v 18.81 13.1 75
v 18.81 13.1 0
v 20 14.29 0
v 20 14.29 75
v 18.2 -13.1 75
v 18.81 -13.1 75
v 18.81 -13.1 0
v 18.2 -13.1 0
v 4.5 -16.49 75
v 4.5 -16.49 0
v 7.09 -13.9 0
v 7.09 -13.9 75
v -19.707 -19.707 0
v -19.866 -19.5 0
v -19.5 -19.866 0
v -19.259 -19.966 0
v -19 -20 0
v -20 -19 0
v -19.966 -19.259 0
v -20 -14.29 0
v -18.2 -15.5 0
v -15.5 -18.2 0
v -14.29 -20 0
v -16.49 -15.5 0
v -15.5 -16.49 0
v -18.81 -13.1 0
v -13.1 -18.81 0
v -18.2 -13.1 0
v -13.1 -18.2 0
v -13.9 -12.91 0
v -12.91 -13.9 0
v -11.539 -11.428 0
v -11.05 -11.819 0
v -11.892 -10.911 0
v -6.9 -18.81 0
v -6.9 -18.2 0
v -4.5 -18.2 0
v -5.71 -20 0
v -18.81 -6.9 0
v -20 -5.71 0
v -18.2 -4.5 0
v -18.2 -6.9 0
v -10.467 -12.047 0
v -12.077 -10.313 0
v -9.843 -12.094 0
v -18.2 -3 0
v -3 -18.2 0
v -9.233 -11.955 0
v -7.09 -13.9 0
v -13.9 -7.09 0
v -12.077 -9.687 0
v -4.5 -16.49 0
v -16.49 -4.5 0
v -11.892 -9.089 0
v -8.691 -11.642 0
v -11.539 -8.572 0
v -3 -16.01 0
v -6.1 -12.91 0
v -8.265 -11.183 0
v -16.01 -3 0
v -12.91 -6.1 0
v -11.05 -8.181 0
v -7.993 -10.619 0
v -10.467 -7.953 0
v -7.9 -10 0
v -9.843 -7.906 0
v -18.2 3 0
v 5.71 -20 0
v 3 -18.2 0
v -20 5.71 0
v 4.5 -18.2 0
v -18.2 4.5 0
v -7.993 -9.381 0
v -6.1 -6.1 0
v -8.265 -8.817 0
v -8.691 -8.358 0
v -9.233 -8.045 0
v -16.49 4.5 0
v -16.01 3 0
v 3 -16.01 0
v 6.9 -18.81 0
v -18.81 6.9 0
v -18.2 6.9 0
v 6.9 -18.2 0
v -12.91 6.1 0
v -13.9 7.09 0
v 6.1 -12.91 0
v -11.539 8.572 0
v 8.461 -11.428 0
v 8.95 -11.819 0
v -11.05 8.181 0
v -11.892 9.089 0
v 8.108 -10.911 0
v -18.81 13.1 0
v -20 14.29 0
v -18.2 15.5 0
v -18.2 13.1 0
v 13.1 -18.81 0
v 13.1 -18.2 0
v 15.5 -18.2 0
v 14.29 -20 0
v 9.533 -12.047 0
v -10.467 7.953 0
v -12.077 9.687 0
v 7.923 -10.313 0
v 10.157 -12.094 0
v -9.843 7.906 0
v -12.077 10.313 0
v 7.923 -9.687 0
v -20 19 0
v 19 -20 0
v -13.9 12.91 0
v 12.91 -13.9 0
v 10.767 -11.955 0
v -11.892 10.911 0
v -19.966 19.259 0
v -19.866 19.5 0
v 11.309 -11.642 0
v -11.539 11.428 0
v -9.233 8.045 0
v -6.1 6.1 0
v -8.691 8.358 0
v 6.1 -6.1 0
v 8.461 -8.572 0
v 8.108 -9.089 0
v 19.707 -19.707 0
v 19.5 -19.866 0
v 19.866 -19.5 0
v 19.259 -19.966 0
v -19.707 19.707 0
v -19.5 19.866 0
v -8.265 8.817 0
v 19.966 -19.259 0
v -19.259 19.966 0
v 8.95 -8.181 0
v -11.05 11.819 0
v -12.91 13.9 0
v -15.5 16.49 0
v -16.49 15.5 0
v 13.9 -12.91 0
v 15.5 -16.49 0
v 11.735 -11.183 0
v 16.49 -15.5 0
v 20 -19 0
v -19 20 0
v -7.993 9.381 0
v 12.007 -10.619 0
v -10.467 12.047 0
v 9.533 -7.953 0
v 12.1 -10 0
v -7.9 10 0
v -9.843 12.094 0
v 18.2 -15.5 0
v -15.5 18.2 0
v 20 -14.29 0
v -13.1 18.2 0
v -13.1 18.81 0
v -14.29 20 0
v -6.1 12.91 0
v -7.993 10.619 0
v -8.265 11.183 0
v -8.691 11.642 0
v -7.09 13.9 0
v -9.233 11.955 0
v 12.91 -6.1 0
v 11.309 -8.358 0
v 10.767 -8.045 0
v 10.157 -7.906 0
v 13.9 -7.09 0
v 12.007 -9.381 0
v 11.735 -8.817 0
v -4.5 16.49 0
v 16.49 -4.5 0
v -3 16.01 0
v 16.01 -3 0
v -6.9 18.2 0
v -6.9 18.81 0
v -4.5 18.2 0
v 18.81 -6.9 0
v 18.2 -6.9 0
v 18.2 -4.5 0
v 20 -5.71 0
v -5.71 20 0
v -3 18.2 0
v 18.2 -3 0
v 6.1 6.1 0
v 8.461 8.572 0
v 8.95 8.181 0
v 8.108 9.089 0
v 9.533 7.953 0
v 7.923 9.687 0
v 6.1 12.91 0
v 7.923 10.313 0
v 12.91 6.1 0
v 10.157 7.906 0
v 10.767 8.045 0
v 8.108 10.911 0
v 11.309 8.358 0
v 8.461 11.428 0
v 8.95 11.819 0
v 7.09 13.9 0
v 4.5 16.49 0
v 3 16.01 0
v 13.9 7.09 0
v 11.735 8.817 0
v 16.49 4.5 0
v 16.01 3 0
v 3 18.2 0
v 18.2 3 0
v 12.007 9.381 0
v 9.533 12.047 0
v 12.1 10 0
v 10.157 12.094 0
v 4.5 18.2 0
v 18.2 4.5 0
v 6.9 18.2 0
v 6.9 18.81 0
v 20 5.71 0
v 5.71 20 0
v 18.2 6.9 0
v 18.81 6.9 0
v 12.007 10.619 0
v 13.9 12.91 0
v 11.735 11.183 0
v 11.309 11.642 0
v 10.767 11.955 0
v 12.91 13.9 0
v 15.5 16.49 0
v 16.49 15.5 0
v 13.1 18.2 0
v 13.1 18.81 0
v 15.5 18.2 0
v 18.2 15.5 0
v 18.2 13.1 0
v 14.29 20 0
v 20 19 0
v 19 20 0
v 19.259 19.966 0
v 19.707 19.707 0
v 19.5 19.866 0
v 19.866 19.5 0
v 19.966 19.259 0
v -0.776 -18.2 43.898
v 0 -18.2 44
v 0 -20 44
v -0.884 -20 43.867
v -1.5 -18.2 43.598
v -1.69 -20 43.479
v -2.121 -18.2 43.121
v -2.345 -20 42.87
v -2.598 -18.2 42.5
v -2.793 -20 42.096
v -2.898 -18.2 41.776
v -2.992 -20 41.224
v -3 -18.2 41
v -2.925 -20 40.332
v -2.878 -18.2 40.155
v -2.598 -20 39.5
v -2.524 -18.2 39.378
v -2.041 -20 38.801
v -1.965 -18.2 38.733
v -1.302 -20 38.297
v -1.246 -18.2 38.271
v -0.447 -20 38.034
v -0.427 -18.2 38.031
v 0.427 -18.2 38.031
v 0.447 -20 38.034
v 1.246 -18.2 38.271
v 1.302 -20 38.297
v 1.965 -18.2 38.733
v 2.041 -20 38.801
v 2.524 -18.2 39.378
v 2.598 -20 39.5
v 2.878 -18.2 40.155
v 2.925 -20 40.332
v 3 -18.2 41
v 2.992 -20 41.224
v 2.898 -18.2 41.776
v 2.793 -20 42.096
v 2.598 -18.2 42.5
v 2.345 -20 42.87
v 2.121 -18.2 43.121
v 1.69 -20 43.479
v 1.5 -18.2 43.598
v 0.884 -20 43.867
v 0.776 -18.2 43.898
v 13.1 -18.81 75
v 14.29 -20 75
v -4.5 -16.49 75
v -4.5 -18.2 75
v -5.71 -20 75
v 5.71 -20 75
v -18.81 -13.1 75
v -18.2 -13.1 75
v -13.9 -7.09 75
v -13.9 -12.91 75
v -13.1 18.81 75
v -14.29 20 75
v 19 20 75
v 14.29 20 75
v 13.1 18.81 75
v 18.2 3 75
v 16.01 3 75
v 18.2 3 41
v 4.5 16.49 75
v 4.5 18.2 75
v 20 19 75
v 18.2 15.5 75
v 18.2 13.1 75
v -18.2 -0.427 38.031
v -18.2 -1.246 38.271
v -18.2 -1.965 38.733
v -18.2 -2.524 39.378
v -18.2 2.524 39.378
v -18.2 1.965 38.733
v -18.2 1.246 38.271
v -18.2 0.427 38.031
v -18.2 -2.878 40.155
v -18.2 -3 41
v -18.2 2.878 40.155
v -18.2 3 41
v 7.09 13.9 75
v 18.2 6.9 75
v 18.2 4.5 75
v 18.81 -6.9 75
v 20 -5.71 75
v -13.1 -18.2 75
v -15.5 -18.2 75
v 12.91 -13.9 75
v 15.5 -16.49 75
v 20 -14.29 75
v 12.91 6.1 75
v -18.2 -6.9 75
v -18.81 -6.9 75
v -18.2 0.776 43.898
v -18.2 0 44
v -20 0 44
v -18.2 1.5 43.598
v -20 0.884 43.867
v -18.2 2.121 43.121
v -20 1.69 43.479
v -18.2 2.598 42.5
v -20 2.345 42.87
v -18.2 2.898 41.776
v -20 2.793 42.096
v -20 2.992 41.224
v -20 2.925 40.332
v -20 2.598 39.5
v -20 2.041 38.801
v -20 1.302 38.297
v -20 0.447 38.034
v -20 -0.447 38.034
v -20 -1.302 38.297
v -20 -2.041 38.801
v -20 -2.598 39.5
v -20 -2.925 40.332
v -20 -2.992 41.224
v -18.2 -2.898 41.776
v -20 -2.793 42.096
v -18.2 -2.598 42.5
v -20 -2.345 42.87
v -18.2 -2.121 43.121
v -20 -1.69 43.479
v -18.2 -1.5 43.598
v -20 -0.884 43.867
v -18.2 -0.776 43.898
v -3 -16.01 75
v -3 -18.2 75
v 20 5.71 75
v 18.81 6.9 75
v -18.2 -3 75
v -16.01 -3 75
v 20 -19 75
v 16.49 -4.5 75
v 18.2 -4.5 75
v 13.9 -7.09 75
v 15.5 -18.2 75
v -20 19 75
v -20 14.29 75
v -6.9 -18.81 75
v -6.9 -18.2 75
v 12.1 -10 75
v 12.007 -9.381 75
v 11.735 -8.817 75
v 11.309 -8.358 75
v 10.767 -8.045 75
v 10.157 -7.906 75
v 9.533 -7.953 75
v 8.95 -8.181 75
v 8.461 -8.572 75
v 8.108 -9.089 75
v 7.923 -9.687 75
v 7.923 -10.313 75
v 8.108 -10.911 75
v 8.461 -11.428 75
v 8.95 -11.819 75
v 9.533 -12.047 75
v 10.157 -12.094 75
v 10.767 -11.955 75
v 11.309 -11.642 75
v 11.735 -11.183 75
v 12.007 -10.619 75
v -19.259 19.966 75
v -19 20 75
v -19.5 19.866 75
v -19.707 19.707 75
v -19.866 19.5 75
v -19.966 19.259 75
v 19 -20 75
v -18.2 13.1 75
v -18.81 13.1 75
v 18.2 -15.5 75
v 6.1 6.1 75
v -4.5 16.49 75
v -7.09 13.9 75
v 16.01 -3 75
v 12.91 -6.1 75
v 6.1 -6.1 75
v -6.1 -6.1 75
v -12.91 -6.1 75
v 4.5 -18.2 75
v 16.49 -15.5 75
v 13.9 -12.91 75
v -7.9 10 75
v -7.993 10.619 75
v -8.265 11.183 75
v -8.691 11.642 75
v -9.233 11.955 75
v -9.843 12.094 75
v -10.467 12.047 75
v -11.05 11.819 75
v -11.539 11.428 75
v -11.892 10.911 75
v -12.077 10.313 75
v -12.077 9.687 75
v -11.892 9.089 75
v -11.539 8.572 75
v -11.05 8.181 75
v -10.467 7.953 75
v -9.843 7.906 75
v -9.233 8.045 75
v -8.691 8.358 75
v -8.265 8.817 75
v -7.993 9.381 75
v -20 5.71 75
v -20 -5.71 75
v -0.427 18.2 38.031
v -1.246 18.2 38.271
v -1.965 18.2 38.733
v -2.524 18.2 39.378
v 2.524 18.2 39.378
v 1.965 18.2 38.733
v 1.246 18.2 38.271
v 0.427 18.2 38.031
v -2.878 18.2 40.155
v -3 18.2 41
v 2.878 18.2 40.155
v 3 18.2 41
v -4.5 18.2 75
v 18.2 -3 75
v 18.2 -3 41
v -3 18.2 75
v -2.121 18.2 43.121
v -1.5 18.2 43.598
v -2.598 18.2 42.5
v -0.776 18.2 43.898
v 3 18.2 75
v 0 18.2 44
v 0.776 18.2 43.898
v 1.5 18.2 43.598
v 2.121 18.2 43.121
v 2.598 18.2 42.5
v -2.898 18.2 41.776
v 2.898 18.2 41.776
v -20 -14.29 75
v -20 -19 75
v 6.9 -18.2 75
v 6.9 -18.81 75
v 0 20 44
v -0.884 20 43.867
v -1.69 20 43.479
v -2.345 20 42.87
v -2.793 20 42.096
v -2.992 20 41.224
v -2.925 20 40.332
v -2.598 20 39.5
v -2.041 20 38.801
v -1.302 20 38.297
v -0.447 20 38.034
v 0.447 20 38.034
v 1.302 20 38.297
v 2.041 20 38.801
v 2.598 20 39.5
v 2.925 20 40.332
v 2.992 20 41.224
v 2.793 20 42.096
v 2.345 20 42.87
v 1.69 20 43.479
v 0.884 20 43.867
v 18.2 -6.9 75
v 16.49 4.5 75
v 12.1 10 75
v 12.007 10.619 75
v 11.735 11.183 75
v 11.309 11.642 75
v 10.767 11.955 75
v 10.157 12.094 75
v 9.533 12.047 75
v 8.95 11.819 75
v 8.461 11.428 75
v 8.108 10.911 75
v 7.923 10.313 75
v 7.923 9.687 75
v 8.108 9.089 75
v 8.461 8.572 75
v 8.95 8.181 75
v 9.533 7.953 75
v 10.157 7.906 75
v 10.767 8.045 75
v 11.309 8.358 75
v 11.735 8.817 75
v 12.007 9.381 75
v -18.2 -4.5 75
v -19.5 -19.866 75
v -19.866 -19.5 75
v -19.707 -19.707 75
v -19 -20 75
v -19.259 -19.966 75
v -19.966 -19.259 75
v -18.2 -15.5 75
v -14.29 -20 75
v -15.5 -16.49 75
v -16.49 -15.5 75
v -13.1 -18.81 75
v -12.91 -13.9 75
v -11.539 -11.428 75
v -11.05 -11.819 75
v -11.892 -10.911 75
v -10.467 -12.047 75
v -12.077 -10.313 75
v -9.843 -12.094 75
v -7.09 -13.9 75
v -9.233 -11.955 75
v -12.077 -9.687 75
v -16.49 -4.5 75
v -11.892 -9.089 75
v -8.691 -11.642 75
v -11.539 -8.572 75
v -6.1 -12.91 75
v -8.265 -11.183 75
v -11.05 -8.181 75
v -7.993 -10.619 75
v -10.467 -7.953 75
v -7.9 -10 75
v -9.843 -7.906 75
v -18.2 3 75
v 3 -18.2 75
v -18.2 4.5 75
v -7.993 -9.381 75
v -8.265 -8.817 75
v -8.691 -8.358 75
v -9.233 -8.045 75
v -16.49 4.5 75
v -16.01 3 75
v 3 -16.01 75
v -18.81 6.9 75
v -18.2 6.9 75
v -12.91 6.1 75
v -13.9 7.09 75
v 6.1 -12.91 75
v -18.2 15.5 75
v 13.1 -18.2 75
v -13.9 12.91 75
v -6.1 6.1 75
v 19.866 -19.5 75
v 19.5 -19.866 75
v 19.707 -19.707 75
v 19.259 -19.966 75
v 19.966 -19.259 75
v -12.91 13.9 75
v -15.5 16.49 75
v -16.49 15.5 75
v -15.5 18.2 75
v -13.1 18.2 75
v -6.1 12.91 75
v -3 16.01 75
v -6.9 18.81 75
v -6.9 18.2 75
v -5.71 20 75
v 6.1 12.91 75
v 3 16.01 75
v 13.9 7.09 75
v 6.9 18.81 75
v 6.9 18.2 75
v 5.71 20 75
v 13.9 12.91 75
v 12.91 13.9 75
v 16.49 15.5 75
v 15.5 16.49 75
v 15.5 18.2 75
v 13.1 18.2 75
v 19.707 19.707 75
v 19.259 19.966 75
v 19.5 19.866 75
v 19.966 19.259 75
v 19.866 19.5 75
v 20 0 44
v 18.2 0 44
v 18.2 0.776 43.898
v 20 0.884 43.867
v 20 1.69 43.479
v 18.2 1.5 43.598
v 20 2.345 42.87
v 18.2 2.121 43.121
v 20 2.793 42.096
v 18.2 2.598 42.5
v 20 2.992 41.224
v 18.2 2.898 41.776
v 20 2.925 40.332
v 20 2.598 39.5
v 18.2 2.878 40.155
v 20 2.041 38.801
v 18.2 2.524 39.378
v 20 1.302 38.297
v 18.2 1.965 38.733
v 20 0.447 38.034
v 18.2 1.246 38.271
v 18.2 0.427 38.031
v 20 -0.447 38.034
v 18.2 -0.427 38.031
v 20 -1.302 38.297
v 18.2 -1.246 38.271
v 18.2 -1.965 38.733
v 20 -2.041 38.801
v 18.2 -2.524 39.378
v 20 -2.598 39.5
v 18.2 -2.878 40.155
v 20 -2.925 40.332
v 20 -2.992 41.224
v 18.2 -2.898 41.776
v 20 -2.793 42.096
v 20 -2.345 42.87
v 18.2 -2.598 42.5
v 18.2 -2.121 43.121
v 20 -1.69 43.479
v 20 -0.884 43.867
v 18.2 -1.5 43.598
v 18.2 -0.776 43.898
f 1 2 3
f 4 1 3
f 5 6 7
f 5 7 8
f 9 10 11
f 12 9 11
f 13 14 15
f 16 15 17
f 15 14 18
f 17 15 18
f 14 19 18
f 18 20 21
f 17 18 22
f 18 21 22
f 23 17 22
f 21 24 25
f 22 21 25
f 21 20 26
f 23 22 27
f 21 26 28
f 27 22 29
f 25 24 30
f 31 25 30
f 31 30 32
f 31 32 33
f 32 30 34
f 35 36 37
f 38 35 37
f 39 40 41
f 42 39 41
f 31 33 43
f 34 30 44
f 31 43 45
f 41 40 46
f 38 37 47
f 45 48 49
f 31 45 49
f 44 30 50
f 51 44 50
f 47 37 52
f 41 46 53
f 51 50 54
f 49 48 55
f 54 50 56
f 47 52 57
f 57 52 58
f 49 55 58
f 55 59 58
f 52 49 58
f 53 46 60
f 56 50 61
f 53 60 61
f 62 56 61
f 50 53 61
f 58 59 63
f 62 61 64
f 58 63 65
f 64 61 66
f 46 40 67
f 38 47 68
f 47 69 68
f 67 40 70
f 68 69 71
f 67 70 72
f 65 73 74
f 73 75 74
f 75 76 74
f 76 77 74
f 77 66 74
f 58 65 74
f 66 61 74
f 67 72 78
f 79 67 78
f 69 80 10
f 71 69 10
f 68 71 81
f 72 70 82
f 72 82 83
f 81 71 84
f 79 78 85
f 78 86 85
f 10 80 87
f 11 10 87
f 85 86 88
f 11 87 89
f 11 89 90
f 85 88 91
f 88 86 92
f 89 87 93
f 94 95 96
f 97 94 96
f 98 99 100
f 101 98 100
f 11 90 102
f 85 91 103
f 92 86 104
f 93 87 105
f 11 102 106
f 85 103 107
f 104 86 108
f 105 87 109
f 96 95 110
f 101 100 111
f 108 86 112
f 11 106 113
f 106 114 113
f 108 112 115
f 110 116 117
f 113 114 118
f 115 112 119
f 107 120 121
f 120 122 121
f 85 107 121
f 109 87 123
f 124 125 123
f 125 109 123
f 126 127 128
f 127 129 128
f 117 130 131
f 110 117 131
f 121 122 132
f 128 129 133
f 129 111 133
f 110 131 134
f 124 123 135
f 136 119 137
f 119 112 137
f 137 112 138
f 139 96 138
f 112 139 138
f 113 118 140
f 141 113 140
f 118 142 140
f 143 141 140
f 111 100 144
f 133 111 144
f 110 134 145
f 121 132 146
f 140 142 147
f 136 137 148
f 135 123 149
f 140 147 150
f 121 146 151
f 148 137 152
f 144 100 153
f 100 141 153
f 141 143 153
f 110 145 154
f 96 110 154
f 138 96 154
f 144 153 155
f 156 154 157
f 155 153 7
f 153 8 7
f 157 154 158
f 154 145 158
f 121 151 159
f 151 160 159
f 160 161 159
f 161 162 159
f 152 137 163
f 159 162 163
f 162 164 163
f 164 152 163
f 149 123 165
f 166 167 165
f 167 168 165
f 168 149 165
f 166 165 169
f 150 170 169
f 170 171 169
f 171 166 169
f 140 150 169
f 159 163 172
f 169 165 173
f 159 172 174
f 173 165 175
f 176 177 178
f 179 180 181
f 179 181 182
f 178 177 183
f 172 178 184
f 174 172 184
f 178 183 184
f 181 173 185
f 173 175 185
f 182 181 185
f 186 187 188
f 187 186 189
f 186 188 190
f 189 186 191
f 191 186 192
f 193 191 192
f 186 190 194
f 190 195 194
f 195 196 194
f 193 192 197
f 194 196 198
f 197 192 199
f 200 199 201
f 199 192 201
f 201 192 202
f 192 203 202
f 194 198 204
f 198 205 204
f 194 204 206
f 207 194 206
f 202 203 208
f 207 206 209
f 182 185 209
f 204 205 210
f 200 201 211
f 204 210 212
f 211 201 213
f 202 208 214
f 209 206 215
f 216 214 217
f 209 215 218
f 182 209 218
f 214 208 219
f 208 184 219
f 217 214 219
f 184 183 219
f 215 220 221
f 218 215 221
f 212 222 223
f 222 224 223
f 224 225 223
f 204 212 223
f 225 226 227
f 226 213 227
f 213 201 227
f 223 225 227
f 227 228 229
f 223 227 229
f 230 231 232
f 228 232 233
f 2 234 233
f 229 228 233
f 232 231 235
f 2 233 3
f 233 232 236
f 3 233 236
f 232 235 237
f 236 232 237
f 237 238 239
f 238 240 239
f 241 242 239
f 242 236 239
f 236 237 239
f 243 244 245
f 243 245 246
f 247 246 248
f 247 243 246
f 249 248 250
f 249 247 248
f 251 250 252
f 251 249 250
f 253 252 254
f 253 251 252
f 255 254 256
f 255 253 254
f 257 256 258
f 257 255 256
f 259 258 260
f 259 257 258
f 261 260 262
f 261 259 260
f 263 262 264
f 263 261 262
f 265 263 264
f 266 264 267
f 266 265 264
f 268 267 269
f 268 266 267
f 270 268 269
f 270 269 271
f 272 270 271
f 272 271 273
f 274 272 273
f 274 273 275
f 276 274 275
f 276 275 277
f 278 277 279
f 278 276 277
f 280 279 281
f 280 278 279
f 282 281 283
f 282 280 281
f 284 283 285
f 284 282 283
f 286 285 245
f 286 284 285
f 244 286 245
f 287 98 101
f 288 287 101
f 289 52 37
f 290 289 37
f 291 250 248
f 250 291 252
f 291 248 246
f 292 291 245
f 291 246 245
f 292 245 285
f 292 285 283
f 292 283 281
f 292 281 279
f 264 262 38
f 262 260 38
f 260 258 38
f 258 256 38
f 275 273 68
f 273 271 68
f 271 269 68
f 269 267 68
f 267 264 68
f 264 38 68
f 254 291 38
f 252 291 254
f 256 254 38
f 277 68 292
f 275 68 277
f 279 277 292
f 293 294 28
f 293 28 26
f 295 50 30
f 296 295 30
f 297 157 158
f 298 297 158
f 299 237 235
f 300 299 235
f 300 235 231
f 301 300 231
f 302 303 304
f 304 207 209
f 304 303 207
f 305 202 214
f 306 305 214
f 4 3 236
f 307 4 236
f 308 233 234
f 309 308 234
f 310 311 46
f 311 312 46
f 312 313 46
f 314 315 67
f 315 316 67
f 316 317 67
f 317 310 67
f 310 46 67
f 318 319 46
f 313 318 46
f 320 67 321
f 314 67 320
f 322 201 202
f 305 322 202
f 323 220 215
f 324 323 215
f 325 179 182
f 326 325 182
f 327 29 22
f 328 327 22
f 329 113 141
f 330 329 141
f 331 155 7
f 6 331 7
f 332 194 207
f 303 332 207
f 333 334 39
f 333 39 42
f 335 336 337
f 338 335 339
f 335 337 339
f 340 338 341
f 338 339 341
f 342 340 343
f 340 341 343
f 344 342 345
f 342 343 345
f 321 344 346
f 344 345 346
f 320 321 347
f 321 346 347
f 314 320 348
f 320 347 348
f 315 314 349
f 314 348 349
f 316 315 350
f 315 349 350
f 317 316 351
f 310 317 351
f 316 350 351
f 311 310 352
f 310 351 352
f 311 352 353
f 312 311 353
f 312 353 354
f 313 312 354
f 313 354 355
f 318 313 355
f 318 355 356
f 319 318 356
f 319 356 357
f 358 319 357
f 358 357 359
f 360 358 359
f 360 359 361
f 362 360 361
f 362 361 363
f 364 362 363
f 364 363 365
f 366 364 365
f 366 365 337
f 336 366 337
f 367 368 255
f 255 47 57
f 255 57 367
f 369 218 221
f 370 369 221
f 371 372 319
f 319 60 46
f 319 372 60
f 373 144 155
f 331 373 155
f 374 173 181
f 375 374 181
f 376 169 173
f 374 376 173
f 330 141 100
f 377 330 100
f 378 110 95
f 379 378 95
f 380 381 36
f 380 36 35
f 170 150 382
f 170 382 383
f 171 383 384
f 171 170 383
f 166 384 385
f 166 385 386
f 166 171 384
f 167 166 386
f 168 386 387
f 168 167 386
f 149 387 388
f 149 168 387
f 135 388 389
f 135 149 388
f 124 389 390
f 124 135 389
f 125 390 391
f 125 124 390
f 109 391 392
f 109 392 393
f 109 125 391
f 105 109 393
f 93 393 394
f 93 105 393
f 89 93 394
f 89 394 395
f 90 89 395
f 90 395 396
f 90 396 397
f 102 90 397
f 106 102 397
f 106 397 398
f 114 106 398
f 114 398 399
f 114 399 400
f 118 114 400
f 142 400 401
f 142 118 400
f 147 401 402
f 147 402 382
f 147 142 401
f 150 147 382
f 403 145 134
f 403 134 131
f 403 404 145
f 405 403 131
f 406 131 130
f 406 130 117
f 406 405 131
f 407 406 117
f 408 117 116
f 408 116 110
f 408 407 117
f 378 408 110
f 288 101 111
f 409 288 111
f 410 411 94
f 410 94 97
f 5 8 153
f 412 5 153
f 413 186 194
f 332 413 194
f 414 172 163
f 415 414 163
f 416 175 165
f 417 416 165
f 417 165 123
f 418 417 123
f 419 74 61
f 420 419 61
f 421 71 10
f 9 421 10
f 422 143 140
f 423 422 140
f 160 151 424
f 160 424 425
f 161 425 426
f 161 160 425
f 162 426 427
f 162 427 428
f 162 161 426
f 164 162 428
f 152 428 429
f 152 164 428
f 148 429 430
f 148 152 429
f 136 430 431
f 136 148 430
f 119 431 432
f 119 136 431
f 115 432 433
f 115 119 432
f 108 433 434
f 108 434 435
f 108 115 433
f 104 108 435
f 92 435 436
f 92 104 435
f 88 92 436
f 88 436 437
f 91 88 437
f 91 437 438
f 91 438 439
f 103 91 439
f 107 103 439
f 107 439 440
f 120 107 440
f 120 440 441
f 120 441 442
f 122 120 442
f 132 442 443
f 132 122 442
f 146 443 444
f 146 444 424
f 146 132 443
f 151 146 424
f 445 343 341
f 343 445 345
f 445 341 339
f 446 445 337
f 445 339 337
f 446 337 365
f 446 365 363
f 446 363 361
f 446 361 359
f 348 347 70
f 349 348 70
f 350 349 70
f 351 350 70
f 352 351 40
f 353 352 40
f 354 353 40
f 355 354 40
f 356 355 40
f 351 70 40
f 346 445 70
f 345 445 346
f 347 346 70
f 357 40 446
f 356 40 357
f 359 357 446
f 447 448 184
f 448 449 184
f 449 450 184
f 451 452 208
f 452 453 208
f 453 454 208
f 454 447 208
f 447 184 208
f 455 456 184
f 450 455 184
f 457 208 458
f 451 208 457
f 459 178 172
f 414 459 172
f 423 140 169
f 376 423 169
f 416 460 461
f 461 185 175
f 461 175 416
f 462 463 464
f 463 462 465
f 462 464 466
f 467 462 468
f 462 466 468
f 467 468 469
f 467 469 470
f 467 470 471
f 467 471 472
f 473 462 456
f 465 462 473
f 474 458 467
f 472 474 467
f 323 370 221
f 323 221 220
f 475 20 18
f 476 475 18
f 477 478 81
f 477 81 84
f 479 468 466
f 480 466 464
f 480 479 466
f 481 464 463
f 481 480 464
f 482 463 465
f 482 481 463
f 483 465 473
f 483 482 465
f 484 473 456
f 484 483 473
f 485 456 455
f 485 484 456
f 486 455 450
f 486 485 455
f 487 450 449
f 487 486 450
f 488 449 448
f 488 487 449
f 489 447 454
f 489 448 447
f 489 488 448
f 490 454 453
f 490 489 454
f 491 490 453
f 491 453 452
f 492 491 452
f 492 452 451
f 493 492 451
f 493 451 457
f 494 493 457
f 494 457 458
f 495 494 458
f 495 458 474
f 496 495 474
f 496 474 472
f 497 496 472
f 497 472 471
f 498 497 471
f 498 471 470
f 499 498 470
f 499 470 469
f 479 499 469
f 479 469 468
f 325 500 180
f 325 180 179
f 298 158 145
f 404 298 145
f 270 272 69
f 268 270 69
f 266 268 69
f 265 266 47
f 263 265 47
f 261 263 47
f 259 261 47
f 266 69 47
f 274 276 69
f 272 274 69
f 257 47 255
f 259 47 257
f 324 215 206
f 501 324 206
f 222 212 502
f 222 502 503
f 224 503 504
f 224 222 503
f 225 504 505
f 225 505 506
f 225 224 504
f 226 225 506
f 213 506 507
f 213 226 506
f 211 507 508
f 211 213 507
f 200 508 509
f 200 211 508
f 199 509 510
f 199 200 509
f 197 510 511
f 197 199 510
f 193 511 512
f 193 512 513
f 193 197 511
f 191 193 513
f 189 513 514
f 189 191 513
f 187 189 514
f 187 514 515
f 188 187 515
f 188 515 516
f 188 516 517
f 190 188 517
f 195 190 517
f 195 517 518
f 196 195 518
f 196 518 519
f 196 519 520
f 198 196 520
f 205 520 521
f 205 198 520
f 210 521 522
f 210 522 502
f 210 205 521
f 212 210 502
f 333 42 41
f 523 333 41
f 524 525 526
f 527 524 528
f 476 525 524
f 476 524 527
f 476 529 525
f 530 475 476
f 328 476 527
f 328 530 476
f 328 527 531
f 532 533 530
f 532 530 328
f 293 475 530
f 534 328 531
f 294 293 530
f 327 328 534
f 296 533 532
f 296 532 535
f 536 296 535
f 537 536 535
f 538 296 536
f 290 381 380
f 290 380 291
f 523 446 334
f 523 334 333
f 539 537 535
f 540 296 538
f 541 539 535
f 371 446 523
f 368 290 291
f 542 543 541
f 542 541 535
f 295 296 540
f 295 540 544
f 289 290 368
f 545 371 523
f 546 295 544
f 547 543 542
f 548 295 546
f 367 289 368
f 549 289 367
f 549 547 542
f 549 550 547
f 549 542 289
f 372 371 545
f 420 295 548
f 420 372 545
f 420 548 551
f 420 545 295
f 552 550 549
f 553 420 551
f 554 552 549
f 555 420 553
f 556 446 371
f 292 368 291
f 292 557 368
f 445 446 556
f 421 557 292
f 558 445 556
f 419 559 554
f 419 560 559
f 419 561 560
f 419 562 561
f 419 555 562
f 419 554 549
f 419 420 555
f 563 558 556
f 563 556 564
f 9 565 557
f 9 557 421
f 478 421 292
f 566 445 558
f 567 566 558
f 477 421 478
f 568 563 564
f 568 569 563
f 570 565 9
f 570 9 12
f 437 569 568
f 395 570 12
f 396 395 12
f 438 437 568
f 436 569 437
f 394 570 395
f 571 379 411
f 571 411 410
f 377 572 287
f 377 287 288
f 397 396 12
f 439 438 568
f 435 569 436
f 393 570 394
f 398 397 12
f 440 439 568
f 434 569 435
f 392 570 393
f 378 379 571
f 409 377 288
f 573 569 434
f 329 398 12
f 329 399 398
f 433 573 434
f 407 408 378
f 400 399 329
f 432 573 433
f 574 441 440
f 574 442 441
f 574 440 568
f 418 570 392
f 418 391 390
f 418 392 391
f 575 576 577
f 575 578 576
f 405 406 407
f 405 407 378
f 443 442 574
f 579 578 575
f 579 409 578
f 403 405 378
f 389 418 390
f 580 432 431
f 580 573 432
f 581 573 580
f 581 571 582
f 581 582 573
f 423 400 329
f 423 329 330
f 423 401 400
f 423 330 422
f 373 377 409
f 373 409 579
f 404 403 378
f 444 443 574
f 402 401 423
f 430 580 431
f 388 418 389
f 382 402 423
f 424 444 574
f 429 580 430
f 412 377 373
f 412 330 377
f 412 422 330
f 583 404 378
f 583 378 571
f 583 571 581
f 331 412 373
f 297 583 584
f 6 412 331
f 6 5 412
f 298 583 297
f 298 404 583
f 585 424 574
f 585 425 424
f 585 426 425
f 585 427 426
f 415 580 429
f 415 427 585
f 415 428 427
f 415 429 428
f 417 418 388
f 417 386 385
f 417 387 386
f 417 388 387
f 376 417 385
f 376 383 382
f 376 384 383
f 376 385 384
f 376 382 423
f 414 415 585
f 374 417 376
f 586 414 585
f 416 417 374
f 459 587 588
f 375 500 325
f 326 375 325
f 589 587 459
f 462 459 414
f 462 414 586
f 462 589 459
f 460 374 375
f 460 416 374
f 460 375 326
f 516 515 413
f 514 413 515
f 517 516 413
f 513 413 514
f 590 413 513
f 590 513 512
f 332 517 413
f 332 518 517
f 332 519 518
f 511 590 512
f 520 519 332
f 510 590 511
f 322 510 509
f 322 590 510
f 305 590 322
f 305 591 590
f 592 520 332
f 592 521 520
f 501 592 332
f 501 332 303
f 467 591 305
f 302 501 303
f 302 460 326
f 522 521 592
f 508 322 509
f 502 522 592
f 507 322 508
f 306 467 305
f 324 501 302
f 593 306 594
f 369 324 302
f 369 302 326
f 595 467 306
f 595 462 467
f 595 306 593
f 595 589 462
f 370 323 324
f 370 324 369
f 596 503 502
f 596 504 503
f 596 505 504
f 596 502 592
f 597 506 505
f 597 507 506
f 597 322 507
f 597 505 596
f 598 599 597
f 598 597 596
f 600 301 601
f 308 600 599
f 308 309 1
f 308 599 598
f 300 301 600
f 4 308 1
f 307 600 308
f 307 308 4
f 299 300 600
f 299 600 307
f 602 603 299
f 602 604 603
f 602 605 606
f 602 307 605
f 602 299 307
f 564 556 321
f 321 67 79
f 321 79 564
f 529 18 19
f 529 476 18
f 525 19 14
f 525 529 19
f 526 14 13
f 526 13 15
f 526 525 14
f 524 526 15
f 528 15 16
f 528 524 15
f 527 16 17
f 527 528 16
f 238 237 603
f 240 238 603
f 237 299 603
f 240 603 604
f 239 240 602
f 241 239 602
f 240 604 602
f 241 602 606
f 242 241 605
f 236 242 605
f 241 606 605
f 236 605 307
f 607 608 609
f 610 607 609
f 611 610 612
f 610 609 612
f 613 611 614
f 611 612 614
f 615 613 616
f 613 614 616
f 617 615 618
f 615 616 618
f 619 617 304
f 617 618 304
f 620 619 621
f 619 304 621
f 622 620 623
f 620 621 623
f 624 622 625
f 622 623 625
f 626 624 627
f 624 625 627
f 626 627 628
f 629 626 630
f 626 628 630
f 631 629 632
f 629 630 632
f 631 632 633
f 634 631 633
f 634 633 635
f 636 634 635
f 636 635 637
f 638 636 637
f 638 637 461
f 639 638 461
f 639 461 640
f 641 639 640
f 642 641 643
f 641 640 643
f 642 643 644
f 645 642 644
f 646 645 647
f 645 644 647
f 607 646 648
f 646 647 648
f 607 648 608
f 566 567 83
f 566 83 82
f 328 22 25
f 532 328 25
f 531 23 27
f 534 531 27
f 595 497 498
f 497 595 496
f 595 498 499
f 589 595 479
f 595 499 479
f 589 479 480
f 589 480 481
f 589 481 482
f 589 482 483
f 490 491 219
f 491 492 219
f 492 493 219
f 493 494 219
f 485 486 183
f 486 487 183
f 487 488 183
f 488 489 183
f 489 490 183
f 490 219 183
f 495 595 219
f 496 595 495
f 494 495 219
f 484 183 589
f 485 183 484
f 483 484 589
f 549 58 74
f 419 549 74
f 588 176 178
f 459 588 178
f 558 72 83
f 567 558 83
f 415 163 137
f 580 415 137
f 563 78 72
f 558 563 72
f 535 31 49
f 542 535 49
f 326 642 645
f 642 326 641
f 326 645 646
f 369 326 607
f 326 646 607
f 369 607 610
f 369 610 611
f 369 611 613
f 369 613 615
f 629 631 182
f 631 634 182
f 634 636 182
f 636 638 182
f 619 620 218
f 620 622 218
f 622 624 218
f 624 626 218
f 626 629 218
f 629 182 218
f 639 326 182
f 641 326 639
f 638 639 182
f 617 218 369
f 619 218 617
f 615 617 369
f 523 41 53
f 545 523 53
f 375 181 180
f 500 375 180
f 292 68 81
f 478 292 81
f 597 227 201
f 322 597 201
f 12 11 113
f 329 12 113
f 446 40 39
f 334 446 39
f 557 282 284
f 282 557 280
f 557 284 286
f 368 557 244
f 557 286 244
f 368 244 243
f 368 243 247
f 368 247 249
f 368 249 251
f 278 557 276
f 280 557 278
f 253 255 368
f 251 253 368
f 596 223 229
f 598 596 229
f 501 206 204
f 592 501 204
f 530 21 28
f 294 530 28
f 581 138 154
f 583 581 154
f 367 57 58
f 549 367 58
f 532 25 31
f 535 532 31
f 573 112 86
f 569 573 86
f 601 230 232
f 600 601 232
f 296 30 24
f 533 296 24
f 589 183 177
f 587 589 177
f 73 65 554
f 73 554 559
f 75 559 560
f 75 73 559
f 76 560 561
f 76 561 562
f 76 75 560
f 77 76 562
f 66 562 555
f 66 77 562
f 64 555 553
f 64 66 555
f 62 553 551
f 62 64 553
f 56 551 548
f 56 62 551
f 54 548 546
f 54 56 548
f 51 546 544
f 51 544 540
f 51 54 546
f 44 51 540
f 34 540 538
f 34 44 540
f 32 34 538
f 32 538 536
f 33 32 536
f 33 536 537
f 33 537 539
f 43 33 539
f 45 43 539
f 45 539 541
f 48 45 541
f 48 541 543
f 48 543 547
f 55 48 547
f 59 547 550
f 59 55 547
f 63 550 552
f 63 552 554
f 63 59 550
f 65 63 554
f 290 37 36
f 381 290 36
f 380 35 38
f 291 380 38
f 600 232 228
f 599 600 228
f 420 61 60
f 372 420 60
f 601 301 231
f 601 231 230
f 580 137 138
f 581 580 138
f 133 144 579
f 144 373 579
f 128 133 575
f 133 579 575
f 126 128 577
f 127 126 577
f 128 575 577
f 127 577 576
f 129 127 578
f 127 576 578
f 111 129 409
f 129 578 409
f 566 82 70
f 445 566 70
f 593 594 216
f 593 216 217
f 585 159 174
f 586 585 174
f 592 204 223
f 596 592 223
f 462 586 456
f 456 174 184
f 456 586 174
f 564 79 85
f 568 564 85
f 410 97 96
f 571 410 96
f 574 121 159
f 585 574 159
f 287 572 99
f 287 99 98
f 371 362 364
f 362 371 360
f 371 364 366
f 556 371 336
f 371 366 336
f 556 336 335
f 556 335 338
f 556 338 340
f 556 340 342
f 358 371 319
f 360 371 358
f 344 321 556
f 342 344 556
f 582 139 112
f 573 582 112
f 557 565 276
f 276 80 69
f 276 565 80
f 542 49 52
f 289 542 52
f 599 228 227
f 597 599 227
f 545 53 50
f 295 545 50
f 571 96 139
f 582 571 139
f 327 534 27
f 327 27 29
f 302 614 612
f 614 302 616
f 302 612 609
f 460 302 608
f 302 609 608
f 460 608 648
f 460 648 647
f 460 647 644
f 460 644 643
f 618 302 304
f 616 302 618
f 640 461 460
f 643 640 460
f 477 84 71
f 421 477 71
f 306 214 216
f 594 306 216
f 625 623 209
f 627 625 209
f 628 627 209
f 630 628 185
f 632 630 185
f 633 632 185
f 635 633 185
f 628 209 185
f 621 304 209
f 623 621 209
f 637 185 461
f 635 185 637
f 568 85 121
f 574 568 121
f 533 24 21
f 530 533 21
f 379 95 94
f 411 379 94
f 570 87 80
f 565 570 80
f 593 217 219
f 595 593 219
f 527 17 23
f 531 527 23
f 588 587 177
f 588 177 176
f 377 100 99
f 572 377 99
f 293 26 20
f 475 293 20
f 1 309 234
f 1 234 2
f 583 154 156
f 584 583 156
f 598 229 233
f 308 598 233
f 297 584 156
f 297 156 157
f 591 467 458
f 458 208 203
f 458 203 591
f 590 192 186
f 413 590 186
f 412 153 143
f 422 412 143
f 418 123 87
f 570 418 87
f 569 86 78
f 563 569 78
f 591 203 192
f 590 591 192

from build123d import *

# Parameters (mm, degrees)
SKETCH_1_R         = 2.1
EXTRUDE_1_DEPTH    = 75
VERRUNDUNG1_R      = 1
SKETCH1_R          = 3
CUT_EXTRUDE1_DEPTH = 41


with BuildPart() as part:
    # 草图1 → 凸台-拉伸1 (new body)
    with BuildSketch(Plane.XY):
        Polygon((5.71, 20), (-5.71, 20), (-6.9, 18.81), (-6.9, 18.2), (-4.5, 18.2), (-4.5, 16.489949494), (-7.089949494, 13.9), (-12.910050506, 13.9), (-15.5, 16.489949494), (-15.5, 18.2), (-13.1, 18.2), (-13.1, 18.81), (-14.29, 20), (-20, 20), (-20, 14.29), (-18.81, 13.1), (-18.2, 13.1), (-18.2, 15.5), (-16.489949494, 15.5), (-13.9, 12.910050506), (-13.9, 7.089949494), (-16.489949494, 4.5), (-18.2, 4.5), (-18.2, 6.9), (-18.81, 6.9), (-20, 5.71), (-20, -5.71), (-18.81, -6.9), (-18.2, -6.9), (-18.2, -4.5), (-16.489949494, -4.5), (-13.9, -7.089949494), (-13.9, -12.910050506), (-16.489949494, -15.5), (-18.2, -15.5), (-18.2, -13.1), (-18.81, -13.1), (-20, -14.29), (-20, -20), (-14.29, -20), (-13.1, -18.81), (-13.1, -18.2), (-15.5, -18.2), (-15.5, -16.489949494), (-12.910050506, -13.9), (-7.089949494, -13.9), (-4.5, -16.489949494), (-4.5, -18.2), (-6.9, -18.2), (-6.9, -18.81), (-5.71, -20), (5.71, -20), (6.9, -18.81), (6.9, -18.2), (4.5, -18.2), (4.5, -16.489949494), (7.089949494, -13.9), (12.910050506, -13.9), (15.5, -16.489949494), (15.5, -18.2), (13.1, -18.2), (13.1, -18.81), (14.29, -20), (20, -20), (20, -14.29), (18.81, -13.1), (18.2, -13.1), (18.2, -15.5), (16.489949494, -15.5), (13.9, -12.910050506), (13.9, -7.089949494), (16.489949494, -4.5), (18.2, -4.5), (18.2, -6.9), (18.81, -6.9), (20, -5.71), (20, 5.71), (18.81, 6.9), (18.2, 6.9), (18.2, 4.5), (16.489949494, 4.5), (13.9, 7.089949494), (13.9, 12.910050506), (16.489949494, 15.5), (18.2, 15.5), (18.2, 13.1), (18.81, 13.1), (20, 14.29), (20, 20), (14.29, 20), (13.1, 18.81), (13.1, 18.2), (15.5, 18.2), (15.5, 16.489949494), (12.910050506, 13.9), (7.089949494, 13.9), (4.5, 16.489949494), (4.5, 18.2), (6.9, 18.2), (6.9, 18.81), align=None)
        with Locations((-10, 10)):
            Circle(SKETCH_1_R, mode=Mode.SUBTRACT)
        with Locations((-10, -10)):
            Circle(SKETCH_1_R, mode=Mode.SUBTRACT)
        with Locations((10, -10)):
            Circle(SKETCH_1_R, mode=Mode.SUBTRACT)
        with Locations((10, 10)):
            Circle(SKETCH_1_R, mode=Mode.SUBTRACT)
        Polygon((-6.1, 6.1), (-6.1, 12.910050506), (-3, 16.010050506), (-3, 18.2), (3, 18.2), (3, 16.010050506), (6.1, 12.910050506), (6.1, 6.1), (12.910050506, 6.1), (16.010050506, 3), (18.2, 3), (18.2, -3), (16.010050506, -3), (12.910050506, -6.1), (6.1, -6.1), (6.1, -12.910050506), (3, -16.010050506), (3, -18.2), (-3, -18.2), (-3, -16.010050506), (-6.1, -12.910050506), (-6.1, -6.1), (-12.910050506, -6.1), (-16.010050506, -3), (-18.2, -3), (-18.2, 3), (-16.010050506, 3), (-12.910050506, 6.1), align=None, mode=Mode.SUBTRACT)
    extrude(amount=EXTRUDE_1_DEPTH)

    # Verrundung1
    verrundung1_edges = [part.edges().sort_by_distance(p)[0] for p in [
        (20, 20, 37.5),
        (20, -20, 37.5),
        (-20, -20, 37.5),
        (-20, 20, 37.5),
    ]]
    fillet(verrundung1_edges, radius=VERRUNDUNG1_R)

    # Sketch1 → Cut-Extrude1 (cut, through all)
    with BuildSketch(Plane.ZY.offset(20)):
        with Locations((41, 0)):
            Circle(SKETCH1_R)
    cut_extrude1 = extrude(amount=-CUT_EXTRUDE1_DEPTH, mode=Mode.SUBTRACT)

    # Mirror1: Cut-Extrude1 across plane
    add(cut_extrude1.mirror(Plane(origin=(0, 0, 0), x_dir=(0, 0, 1), z_dir=(-0.707106781, -0.707106781, 0))), mode=Mode.SUBTRACT)


solid = part.part
